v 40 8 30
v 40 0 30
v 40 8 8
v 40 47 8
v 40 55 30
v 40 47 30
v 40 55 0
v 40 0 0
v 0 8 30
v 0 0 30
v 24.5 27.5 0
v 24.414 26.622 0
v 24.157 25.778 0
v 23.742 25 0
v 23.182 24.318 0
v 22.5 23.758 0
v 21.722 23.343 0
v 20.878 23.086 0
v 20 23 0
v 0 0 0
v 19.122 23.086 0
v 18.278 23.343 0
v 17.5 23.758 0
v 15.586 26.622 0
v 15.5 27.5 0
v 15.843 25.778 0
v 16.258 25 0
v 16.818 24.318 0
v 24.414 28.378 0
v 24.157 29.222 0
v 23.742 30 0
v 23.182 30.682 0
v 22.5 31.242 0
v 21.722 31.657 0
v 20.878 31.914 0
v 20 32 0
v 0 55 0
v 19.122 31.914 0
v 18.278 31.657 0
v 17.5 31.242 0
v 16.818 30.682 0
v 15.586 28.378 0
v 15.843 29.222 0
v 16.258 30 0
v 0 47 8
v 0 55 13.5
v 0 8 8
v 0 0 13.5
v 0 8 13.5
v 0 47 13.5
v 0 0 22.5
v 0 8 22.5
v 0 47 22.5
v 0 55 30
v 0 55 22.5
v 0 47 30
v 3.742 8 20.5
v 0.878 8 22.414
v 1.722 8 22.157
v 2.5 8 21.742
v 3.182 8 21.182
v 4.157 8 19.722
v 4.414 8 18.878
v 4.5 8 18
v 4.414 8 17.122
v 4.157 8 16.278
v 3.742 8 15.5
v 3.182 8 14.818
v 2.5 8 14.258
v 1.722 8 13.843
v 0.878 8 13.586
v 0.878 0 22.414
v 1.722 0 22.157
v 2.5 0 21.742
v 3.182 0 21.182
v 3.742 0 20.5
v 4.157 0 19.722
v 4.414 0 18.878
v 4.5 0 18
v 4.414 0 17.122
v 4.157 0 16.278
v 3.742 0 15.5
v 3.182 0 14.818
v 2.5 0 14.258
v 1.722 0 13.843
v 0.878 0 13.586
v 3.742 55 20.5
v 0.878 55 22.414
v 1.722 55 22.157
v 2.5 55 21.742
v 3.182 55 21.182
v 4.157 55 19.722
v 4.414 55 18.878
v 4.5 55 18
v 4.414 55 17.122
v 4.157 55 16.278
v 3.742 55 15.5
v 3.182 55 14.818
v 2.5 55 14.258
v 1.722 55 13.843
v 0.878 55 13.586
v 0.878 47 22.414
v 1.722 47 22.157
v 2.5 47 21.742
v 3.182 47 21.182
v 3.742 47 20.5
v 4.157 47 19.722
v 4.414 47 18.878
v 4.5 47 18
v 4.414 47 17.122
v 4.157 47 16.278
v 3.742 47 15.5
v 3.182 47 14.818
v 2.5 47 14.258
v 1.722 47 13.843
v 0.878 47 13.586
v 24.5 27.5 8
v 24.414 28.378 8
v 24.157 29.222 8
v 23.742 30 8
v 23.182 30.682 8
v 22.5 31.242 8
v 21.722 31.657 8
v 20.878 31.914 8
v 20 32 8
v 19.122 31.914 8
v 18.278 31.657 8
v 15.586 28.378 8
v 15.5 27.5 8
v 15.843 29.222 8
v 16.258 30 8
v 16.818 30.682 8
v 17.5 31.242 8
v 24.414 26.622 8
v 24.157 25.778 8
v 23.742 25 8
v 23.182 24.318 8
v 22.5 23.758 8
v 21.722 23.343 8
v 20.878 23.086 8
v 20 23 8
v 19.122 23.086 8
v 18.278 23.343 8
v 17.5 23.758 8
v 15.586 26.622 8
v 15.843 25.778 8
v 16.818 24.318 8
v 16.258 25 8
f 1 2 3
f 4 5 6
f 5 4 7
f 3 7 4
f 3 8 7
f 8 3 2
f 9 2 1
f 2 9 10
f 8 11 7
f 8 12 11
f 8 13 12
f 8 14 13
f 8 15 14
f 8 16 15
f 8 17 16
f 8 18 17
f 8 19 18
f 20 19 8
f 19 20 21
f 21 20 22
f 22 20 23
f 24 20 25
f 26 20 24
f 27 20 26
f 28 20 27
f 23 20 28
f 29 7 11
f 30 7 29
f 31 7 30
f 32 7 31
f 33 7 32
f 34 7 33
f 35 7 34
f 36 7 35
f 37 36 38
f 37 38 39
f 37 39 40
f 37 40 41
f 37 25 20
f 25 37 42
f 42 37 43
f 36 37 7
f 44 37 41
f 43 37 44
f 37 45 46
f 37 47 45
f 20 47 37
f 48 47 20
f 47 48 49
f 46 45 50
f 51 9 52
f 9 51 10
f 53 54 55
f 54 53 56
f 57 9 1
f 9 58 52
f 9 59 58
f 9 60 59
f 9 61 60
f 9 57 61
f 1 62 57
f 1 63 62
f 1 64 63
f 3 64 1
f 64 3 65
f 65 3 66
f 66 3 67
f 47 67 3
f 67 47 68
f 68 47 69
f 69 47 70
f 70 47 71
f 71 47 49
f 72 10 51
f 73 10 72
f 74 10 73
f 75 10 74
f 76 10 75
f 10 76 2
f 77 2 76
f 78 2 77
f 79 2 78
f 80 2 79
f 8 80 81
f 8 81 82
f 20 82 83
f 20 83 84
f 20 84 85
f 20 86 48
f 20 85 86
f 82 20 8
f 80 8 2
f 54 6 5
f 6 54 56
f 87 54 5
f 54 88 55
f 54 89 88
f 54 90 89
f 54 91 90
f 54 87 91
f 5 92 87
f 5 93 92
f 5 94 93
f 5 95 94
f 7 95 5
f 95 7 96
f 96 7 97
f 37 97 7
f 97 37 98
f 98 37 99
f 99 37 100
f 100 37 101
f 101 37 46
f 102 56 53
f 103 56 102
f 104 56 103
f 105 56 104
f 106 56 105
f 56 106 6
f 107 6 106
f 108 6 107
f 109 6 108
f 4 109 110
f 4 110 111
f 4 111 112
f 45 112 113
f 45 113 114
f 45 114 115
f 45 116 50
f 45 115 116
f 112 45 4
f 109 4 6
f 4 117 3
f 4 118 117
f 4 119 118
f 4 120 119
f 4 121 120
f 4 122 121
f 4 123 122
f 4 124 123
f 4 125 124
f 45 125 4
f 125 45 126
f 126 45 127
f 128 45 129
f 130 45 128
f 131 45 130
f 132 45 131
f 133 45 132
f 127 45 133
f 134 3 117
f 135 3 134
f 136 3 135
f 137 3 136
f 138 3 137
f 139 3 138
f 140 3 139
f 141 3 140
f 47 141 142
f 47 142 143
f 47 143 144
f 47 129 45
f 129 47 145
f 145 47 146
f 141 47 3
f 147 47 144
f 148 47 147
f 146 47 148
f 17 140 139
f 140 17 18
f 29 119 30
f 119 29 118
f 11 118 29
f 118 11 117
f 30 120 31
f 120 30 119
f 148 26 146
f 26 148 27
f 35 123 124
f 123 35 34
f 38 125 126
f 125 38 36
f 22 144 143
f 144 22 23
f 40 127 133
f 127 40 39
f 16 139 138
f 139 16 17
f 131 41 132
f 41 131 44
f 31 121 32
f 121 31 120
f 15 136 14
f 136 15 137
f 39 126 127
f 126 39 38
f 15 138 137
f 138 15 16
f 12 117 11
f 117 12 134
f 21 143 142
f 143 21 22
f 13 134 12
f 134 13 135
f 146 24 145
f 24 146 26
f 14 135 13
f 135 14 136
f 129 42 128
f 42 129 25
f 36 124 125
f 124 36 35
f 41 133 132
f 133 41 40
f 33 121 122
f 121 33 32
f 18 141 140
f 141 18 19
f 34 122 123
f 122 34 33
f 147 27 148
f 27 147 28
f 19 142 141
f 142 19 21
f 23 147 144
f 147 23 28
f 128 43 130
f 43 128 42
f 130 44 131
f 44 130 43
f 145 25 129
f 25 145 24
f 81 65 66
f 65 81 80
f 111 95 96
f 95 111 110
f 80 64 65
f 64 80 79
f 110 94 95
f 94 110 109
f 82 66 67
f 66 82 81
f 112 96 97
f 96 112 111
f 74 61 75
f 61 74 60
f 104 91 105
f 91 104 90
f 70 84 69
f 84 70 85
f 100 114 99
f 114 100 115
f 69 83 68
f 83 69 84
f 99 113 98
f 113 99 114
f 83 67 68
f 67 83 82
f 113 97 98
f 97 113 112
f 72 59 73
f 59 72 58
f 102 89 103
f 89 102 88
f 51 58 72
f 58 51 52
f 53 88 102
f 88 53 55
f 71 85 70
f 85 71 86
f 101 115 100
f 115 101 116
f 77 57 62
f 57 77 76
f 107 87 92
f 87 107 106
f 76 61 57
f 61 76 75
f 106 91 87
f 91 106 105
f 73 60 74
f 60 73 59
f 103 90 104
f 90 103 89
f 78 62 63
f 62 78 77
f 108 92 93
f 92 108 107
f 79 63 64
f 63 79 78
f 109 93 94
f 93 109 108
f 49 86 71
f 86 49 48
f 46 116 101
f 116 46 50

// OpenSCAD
$fn = 32;

// ----------------------------------------------------------------------
// U-bracket: 40 x 55 x 30 mm
// ----------------------------------------------------------------------

// --- parameters (mm) ---
length = 40;              // outer length, X
width = 55;               // outer width, Y
height = 30;              // upright height, Z
thick = 8;                // wall thickness
hole_d = 9;               // clearance for M8

module hole_z(px, py) {
  translate([px, py, -2.5]) cylinder(h = thick + 5, d = hole_d);
}
module hole_y_pz(pz) {
  /* through both uprights along Y */
  translate([0, -2.5, pz]) rotate([-90, 0, 0]) cylinder(h = width + 5, d = hole_d);
}

module base() {
  cube([length, width, thick]);
}

module uprights() {
  cube([length, thick, height]);
  translate([0, width - thick, 0]) cube([length, thick, height]);
}

difference() {
  union() {
    base();
    uprights();
  }
  hole_z(20, 27.5);
  hole_y_pz(18);
}
